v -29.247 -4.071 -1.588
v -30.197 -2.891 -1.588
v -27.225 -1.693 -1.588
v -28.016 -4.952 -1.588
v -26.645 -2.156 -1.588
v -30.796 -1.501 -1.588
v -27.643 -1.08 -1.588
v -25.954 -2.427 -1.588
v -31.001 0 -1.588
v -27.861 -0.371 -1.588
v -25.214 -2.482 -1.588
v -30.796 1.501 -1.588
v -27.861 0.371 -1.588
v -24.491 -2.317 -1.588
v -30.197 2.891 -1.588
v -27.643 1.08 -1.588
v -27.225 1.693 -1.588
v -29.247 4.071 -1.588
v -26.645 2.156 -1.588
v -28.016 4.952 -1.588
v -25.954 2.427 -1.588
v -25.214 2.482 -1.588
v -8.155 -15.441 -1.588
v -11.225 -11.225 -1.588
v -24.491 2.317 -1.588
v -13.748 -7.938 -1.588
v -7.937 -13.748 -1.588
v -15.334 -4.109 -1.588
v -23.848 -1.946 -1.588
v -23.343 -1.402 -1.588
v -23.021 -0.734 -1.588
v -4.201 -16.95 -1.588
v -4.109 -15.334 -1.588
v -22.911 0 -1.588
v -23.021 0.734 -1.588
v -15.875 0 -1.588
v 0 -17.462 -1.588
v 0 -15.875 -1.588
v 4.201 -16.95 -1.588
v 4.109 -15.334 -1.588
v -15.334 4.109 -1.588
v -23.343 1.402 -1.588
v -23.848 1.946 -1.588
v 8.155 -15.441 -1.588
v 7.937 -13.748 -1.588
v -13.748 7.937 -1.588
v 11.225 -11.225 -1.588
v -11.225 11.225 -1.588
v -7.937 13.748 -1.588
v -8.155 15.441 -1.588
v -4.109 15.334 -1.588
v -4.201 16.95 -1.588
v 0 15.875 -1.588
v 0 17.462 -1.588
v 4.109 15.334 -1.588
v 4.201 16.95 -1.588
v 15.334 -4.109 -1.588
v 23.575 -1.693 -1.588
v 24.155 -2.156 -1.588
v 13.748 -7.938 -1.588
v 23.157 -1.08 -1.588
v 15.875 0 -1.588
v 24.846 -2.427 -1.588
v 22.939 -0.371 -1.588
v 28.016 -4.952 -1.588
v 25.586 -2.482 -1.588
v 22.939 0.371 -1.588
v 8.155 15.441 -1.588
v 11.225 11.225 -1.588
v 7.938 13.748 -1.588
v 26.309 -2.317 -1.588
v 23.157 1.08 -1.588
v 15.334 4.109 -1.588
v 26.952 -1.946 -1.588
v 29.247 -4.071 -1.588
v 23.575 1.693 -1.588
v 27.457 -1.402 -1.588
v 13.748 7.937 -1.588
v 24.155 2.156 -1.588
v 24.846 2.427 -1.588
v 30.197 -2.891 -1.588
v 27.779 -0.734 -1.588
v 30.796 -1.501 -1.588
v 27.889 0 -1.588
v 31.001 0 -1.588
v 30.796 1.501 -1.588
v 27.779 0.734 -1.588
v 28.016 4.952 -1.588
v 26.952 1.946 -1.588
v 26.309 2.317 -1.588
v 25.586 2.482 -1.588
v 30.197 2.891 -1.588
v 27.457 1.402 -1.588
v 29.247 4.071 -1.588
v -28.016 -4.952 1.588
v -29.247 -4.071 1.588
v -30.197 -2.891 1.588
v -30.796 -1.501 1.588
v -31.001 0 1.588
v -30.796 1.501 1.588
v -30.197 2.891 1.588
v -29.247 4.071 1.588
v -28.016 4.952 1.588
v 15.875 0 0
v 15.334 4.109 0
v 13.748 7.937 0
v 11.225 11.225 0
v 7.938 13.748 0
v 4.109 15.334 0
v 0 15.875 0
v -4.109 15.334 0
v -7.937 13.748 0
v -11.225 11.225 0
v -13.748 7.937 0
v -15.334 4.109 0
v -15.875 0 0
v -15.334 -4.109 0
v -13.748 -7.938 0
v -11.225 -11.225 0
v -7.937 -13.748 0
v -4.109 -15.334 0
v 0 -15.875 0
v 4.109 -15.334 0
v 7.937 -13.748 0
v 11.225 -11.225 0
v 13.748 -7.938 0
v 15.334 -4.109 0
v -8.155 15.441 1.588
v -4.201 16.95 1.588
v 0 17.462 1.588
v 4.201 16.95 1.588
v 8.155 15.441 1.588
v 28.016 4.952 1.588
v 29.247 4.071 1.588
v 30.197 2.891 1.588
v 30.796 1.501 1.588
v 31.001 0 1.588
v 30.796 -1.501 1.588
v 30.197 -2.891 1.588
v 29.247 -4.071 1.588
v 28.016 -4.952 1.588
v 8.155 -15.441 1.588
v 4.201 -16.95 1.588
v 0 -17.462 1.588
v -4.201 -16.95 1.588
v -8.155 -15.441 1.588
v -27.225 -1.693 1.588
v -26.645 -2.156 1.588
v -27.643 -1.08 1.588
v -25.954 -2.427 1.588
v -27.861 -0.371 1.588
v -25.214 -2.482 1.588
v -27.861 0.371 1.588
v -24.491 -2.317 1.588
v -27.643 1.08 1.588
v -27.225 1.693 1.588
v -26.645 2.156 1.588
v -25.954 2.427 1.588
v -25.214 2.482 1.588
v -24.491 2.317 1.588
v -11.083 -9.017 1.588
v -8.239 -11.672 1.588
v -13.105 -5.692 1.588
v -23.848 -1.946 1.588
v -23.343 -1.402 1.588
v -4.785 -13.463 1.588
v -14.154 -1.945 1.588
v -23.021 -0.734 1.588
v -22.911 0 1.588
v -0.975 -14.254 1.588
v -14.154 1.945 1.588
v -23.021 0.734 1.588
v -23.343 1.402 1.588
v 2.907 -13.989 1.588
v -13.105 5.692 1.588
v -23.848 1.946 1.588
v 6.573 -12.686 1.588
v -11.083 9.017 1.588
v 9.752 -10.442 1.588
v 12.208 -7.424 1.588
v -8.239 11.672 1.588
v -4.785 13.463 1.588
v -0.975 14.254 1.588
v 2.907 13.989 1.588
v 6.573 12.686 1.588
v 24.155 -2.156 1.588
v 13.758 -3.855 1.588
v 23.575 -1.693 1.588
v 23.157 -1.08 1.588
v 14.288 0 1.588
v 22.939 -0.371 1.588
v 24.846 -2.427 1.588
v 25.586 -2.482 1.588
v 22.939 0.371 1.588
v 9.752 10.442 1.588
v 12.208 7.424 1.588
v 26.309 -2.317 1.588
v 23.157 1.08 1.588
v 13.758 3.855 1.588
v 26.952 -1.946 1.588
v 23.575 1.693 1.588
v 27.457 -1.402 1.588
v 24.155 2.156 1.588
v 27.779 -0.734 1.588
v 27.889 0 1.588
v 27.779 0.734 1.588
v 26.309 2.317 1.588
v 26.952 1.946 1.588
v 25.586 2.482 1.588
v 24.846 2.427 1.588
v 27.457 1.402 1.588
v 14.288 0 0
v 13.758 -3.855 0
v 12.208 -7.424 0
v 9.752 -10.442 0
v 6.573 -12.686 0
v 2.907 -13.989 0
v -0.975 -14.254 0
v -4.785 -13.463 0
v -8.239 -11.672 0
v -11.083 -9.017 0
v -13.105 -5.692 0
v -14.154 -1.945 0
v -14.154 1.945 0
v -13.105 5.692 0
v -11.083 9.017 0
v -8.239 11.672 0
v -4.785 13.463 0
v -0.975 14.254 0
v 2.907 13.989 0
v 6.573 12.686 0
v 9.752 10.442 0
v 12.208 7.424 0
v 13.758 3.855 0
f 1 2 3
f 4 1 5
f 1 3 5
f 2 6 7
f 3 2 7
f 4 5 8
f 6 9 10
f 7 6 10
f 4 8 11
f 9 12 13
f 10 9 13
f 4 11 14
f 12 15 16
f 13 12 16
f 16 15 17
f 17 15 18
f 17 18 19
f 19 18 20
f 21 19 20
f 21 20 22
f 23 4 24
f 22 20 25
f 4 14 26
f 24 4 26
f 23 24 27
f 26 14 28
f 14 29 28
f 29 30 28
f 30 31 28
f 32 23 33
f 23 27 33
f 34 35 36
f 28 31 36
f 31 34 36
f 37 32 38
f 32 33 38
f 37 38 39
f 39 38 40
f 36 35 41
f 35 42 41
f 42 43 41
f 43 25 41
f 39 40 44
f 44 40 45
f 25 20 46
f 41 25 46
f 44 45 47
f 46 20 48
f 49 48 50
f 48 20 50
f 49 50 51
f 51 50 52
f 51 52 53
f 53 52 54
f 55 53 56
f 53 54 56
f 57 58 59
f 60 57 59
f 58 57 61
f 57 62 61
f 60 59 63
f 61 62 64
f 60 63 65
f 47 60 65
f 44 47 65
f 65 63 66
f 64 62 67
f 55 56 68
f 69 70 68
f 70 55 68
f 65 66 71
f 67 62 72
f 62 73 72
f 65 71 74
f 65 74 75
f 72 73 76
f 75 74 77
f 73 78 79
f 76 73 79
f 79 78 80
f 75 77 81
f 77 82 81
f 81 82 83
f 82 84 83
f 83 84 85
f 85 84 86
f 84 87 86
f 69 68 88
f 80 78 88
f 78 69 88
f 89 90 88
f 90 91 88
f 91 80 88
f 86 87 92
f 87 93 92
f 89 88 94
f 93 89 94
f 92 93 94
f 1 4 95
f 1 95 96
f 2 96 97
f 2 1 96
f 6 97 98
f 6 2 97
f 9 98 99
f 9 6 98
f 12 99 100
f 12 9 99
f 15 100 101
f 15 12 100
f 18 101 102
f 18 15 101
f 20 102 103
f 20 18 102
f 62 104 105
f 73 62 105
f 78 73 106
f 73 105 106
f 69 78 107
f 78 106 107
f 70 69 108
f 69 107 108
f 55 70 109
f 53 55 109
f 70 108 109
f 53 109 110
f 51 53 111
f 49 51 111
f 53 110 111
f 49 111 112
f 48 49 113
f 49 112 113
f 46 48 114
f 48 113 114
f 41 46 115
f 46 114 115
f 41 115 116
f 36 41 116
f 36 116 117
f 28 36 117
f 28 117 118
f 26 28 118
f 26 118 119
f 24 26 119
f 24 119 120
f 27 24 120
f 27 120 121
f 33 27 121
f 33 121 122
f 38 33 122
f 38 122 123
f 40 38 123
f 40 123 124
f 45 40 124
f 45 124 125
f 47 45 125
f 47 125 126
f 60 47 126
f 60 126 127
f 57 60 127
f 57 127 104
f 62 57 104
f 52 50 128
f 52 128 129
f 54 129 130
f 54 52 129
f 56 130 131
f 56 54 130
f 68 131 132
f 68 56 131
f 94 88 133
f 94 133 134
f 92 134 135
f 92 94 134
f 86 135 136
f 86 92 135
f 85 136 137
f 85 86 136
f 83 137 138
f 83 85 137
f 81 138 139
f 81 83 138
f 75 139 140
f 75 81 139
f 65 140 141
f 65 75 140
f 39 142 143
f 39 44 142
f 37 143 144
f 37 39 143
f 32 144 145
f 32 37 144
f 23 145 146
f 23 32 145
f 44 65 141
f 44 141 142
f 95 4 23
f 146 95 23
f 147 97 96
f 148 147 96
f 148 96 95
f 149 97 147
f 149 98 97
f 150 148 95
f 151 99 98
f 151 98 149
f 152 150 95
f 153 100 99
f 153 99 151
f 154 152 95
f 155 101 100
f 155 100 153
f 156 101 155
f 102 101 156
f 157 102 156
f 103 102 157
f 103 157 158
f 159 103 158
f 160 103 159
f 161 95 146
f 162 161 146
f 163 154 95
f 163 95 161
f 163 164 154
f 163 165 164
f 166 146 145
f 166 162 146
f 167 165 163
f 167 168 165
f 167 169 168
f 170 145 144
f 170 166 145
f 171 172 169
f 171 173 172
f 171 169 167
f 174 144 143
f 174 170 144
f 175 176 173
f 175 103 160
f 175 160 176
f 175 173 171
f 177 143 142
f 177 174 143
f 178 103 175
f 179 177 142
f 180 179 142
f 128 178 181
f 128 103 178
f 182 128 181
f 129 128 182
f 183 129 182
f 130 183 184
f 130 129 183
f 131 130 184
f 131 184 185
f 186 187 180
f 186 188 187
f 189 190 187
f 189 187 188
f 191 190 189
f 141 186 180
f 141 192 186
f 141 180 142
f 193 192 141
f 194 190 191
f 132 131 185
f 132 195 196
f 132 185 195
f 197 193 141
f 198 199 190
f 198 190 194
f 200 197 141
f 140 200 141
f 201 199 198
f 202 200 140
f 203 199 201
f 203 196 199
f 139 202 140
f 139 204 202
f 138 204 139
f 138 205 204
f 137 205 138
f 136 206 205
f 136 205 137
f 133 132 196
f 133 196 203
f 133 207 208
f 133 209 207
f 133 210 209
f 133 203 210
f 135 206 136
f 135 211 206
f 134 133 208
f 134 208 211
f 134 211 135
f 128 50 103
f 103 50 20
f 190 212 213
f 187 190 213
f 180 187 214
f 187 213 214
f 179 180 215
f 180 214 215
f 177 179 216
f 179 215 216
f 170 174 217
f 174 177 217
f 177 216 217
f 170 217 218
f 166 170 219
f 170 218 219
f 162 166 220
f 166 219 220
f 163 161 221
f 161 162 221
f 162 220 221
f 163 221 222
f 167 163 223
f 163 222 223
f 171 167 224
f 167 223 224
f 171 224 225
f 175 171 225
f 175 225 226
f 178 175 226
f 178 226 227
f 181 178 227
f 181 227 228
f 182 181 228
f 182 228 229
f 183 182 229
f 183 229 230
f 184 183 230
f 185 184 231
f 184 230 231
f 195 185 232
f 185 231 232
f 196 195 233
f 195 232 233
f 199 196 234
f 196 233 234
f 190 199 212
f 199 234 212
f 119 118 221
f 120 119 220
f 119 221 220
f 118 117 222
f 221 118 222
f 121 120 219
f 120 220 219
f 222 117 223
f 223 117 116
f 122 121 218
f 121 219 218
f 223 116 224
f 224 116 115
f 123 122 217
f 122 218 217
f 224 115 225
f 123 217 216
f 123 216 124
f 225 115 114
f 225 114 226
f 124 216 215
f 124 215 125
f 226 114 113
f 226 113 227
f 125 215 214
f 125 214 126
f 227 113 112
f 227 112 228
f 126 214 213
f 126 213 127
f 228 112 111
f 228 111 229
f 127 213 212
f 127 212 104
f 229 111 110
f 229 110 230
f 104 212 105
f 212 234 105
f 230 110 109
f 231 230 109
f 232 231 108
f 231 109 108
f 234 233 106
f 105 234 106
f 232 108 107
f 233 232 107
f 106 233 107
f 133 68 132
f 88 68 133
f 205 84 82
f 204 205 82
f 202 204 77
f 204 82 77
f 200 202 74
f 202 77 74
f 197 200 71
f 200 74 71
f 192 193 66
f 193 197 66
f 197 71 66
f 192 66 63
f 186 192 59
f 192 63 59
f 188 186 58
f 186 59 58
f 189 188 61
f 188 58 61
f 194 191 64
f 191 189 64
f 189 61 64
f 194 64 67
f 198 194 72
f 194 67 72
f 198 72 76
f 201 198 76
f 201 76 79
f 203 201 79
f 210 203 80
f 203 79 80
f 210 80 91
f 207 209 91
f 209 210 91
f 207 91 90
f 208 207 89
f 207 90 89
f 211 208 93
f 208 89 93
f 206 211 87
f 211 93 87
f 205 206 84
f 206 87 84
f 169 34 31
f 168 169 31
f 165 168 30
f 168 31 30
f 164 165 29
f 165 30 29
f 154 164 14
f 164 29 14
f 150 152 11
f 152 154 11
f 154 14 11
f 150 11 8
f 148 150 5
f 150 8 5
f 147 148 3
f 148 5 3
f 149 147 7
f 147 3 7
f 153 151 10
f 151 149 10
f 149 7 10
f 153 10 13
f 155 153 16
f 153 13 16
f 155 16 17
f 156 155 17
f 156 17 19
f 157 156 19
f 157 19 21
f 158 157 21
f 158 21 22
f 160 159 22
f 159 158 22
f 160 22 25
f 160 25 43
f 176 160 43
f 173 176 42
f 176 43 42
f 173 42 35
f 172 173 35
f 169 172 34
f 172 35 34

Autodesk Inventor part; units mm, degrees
ref_plane "YZ Plane" through (0, 0, 0) normal (1, 0, 0) x (0, 1, 0)
ref_plane "XZ Plane" through (0, 0, 0) normal (0, 1, 0) x (-1, 0, 0)
ref_plane "XY Plane" through (0, 0, 0) normal (0, 0, 1) x (1, 0, 0)
sketch "Sketch1" plane through (0, 0, 0) normal (0, 0, 1) x (1, 0, 0)
  circle A0 centre (0, 0) radius 14.2875
  circle A1 centre (0, 0) radius 15.875
  line L0 (-28.0155, -4.9525) -> (-8.155, -15.4413)
  line L1 (28.0155, -4.9525) -> (8.155, -15.4413)
  line L2 (-8.155, 15.4413) -> (-28.0155, 4.9525)
  line L3 (8.155, 15.4413) -> (28.0155, 4.9525)
  arc A2 (8.155, 15.4413) -> (-8.155, 15.4413) centre (0, 0) ccw
  arc A3 (-8.155, -15.4413) -> (8.155, -15.4413) centre (0, 0) ccw
  arc A4 (-28.0155, 4.9525) -> (-28.0155, -4.9525) centre (-25.4, 0) ccw
  arc A5 (28.0155, -4.9525) -> (28.0155, 4.9525) centre (25.4, 0) ccw
  circle A6 centre (-25.4, 0) radius 2.4892
  circle A7 centre (25.4, 0) radius 2.4892
  dimension "d0" = 28.575
  dimension "d2" = 31.75
  dimension "d3" = 34.925
  dimension "d4" = 4.9784
  dimension "d5" = 50.8
  dimension "d6" = 11.2014
extrude "Extrusion1" add sketch "Sketch1" along normal mid plane 3.175 contours A1 | A4 L2 A2 L3 A5 L1 A3 L0
extrude "Extrusion2" cut sketch "Sketch1" against normal blind 1.5875 contours A1
properties part number "Thriftybot Bearing Hat (TTB-0059)" material "Aluminum 6061"
